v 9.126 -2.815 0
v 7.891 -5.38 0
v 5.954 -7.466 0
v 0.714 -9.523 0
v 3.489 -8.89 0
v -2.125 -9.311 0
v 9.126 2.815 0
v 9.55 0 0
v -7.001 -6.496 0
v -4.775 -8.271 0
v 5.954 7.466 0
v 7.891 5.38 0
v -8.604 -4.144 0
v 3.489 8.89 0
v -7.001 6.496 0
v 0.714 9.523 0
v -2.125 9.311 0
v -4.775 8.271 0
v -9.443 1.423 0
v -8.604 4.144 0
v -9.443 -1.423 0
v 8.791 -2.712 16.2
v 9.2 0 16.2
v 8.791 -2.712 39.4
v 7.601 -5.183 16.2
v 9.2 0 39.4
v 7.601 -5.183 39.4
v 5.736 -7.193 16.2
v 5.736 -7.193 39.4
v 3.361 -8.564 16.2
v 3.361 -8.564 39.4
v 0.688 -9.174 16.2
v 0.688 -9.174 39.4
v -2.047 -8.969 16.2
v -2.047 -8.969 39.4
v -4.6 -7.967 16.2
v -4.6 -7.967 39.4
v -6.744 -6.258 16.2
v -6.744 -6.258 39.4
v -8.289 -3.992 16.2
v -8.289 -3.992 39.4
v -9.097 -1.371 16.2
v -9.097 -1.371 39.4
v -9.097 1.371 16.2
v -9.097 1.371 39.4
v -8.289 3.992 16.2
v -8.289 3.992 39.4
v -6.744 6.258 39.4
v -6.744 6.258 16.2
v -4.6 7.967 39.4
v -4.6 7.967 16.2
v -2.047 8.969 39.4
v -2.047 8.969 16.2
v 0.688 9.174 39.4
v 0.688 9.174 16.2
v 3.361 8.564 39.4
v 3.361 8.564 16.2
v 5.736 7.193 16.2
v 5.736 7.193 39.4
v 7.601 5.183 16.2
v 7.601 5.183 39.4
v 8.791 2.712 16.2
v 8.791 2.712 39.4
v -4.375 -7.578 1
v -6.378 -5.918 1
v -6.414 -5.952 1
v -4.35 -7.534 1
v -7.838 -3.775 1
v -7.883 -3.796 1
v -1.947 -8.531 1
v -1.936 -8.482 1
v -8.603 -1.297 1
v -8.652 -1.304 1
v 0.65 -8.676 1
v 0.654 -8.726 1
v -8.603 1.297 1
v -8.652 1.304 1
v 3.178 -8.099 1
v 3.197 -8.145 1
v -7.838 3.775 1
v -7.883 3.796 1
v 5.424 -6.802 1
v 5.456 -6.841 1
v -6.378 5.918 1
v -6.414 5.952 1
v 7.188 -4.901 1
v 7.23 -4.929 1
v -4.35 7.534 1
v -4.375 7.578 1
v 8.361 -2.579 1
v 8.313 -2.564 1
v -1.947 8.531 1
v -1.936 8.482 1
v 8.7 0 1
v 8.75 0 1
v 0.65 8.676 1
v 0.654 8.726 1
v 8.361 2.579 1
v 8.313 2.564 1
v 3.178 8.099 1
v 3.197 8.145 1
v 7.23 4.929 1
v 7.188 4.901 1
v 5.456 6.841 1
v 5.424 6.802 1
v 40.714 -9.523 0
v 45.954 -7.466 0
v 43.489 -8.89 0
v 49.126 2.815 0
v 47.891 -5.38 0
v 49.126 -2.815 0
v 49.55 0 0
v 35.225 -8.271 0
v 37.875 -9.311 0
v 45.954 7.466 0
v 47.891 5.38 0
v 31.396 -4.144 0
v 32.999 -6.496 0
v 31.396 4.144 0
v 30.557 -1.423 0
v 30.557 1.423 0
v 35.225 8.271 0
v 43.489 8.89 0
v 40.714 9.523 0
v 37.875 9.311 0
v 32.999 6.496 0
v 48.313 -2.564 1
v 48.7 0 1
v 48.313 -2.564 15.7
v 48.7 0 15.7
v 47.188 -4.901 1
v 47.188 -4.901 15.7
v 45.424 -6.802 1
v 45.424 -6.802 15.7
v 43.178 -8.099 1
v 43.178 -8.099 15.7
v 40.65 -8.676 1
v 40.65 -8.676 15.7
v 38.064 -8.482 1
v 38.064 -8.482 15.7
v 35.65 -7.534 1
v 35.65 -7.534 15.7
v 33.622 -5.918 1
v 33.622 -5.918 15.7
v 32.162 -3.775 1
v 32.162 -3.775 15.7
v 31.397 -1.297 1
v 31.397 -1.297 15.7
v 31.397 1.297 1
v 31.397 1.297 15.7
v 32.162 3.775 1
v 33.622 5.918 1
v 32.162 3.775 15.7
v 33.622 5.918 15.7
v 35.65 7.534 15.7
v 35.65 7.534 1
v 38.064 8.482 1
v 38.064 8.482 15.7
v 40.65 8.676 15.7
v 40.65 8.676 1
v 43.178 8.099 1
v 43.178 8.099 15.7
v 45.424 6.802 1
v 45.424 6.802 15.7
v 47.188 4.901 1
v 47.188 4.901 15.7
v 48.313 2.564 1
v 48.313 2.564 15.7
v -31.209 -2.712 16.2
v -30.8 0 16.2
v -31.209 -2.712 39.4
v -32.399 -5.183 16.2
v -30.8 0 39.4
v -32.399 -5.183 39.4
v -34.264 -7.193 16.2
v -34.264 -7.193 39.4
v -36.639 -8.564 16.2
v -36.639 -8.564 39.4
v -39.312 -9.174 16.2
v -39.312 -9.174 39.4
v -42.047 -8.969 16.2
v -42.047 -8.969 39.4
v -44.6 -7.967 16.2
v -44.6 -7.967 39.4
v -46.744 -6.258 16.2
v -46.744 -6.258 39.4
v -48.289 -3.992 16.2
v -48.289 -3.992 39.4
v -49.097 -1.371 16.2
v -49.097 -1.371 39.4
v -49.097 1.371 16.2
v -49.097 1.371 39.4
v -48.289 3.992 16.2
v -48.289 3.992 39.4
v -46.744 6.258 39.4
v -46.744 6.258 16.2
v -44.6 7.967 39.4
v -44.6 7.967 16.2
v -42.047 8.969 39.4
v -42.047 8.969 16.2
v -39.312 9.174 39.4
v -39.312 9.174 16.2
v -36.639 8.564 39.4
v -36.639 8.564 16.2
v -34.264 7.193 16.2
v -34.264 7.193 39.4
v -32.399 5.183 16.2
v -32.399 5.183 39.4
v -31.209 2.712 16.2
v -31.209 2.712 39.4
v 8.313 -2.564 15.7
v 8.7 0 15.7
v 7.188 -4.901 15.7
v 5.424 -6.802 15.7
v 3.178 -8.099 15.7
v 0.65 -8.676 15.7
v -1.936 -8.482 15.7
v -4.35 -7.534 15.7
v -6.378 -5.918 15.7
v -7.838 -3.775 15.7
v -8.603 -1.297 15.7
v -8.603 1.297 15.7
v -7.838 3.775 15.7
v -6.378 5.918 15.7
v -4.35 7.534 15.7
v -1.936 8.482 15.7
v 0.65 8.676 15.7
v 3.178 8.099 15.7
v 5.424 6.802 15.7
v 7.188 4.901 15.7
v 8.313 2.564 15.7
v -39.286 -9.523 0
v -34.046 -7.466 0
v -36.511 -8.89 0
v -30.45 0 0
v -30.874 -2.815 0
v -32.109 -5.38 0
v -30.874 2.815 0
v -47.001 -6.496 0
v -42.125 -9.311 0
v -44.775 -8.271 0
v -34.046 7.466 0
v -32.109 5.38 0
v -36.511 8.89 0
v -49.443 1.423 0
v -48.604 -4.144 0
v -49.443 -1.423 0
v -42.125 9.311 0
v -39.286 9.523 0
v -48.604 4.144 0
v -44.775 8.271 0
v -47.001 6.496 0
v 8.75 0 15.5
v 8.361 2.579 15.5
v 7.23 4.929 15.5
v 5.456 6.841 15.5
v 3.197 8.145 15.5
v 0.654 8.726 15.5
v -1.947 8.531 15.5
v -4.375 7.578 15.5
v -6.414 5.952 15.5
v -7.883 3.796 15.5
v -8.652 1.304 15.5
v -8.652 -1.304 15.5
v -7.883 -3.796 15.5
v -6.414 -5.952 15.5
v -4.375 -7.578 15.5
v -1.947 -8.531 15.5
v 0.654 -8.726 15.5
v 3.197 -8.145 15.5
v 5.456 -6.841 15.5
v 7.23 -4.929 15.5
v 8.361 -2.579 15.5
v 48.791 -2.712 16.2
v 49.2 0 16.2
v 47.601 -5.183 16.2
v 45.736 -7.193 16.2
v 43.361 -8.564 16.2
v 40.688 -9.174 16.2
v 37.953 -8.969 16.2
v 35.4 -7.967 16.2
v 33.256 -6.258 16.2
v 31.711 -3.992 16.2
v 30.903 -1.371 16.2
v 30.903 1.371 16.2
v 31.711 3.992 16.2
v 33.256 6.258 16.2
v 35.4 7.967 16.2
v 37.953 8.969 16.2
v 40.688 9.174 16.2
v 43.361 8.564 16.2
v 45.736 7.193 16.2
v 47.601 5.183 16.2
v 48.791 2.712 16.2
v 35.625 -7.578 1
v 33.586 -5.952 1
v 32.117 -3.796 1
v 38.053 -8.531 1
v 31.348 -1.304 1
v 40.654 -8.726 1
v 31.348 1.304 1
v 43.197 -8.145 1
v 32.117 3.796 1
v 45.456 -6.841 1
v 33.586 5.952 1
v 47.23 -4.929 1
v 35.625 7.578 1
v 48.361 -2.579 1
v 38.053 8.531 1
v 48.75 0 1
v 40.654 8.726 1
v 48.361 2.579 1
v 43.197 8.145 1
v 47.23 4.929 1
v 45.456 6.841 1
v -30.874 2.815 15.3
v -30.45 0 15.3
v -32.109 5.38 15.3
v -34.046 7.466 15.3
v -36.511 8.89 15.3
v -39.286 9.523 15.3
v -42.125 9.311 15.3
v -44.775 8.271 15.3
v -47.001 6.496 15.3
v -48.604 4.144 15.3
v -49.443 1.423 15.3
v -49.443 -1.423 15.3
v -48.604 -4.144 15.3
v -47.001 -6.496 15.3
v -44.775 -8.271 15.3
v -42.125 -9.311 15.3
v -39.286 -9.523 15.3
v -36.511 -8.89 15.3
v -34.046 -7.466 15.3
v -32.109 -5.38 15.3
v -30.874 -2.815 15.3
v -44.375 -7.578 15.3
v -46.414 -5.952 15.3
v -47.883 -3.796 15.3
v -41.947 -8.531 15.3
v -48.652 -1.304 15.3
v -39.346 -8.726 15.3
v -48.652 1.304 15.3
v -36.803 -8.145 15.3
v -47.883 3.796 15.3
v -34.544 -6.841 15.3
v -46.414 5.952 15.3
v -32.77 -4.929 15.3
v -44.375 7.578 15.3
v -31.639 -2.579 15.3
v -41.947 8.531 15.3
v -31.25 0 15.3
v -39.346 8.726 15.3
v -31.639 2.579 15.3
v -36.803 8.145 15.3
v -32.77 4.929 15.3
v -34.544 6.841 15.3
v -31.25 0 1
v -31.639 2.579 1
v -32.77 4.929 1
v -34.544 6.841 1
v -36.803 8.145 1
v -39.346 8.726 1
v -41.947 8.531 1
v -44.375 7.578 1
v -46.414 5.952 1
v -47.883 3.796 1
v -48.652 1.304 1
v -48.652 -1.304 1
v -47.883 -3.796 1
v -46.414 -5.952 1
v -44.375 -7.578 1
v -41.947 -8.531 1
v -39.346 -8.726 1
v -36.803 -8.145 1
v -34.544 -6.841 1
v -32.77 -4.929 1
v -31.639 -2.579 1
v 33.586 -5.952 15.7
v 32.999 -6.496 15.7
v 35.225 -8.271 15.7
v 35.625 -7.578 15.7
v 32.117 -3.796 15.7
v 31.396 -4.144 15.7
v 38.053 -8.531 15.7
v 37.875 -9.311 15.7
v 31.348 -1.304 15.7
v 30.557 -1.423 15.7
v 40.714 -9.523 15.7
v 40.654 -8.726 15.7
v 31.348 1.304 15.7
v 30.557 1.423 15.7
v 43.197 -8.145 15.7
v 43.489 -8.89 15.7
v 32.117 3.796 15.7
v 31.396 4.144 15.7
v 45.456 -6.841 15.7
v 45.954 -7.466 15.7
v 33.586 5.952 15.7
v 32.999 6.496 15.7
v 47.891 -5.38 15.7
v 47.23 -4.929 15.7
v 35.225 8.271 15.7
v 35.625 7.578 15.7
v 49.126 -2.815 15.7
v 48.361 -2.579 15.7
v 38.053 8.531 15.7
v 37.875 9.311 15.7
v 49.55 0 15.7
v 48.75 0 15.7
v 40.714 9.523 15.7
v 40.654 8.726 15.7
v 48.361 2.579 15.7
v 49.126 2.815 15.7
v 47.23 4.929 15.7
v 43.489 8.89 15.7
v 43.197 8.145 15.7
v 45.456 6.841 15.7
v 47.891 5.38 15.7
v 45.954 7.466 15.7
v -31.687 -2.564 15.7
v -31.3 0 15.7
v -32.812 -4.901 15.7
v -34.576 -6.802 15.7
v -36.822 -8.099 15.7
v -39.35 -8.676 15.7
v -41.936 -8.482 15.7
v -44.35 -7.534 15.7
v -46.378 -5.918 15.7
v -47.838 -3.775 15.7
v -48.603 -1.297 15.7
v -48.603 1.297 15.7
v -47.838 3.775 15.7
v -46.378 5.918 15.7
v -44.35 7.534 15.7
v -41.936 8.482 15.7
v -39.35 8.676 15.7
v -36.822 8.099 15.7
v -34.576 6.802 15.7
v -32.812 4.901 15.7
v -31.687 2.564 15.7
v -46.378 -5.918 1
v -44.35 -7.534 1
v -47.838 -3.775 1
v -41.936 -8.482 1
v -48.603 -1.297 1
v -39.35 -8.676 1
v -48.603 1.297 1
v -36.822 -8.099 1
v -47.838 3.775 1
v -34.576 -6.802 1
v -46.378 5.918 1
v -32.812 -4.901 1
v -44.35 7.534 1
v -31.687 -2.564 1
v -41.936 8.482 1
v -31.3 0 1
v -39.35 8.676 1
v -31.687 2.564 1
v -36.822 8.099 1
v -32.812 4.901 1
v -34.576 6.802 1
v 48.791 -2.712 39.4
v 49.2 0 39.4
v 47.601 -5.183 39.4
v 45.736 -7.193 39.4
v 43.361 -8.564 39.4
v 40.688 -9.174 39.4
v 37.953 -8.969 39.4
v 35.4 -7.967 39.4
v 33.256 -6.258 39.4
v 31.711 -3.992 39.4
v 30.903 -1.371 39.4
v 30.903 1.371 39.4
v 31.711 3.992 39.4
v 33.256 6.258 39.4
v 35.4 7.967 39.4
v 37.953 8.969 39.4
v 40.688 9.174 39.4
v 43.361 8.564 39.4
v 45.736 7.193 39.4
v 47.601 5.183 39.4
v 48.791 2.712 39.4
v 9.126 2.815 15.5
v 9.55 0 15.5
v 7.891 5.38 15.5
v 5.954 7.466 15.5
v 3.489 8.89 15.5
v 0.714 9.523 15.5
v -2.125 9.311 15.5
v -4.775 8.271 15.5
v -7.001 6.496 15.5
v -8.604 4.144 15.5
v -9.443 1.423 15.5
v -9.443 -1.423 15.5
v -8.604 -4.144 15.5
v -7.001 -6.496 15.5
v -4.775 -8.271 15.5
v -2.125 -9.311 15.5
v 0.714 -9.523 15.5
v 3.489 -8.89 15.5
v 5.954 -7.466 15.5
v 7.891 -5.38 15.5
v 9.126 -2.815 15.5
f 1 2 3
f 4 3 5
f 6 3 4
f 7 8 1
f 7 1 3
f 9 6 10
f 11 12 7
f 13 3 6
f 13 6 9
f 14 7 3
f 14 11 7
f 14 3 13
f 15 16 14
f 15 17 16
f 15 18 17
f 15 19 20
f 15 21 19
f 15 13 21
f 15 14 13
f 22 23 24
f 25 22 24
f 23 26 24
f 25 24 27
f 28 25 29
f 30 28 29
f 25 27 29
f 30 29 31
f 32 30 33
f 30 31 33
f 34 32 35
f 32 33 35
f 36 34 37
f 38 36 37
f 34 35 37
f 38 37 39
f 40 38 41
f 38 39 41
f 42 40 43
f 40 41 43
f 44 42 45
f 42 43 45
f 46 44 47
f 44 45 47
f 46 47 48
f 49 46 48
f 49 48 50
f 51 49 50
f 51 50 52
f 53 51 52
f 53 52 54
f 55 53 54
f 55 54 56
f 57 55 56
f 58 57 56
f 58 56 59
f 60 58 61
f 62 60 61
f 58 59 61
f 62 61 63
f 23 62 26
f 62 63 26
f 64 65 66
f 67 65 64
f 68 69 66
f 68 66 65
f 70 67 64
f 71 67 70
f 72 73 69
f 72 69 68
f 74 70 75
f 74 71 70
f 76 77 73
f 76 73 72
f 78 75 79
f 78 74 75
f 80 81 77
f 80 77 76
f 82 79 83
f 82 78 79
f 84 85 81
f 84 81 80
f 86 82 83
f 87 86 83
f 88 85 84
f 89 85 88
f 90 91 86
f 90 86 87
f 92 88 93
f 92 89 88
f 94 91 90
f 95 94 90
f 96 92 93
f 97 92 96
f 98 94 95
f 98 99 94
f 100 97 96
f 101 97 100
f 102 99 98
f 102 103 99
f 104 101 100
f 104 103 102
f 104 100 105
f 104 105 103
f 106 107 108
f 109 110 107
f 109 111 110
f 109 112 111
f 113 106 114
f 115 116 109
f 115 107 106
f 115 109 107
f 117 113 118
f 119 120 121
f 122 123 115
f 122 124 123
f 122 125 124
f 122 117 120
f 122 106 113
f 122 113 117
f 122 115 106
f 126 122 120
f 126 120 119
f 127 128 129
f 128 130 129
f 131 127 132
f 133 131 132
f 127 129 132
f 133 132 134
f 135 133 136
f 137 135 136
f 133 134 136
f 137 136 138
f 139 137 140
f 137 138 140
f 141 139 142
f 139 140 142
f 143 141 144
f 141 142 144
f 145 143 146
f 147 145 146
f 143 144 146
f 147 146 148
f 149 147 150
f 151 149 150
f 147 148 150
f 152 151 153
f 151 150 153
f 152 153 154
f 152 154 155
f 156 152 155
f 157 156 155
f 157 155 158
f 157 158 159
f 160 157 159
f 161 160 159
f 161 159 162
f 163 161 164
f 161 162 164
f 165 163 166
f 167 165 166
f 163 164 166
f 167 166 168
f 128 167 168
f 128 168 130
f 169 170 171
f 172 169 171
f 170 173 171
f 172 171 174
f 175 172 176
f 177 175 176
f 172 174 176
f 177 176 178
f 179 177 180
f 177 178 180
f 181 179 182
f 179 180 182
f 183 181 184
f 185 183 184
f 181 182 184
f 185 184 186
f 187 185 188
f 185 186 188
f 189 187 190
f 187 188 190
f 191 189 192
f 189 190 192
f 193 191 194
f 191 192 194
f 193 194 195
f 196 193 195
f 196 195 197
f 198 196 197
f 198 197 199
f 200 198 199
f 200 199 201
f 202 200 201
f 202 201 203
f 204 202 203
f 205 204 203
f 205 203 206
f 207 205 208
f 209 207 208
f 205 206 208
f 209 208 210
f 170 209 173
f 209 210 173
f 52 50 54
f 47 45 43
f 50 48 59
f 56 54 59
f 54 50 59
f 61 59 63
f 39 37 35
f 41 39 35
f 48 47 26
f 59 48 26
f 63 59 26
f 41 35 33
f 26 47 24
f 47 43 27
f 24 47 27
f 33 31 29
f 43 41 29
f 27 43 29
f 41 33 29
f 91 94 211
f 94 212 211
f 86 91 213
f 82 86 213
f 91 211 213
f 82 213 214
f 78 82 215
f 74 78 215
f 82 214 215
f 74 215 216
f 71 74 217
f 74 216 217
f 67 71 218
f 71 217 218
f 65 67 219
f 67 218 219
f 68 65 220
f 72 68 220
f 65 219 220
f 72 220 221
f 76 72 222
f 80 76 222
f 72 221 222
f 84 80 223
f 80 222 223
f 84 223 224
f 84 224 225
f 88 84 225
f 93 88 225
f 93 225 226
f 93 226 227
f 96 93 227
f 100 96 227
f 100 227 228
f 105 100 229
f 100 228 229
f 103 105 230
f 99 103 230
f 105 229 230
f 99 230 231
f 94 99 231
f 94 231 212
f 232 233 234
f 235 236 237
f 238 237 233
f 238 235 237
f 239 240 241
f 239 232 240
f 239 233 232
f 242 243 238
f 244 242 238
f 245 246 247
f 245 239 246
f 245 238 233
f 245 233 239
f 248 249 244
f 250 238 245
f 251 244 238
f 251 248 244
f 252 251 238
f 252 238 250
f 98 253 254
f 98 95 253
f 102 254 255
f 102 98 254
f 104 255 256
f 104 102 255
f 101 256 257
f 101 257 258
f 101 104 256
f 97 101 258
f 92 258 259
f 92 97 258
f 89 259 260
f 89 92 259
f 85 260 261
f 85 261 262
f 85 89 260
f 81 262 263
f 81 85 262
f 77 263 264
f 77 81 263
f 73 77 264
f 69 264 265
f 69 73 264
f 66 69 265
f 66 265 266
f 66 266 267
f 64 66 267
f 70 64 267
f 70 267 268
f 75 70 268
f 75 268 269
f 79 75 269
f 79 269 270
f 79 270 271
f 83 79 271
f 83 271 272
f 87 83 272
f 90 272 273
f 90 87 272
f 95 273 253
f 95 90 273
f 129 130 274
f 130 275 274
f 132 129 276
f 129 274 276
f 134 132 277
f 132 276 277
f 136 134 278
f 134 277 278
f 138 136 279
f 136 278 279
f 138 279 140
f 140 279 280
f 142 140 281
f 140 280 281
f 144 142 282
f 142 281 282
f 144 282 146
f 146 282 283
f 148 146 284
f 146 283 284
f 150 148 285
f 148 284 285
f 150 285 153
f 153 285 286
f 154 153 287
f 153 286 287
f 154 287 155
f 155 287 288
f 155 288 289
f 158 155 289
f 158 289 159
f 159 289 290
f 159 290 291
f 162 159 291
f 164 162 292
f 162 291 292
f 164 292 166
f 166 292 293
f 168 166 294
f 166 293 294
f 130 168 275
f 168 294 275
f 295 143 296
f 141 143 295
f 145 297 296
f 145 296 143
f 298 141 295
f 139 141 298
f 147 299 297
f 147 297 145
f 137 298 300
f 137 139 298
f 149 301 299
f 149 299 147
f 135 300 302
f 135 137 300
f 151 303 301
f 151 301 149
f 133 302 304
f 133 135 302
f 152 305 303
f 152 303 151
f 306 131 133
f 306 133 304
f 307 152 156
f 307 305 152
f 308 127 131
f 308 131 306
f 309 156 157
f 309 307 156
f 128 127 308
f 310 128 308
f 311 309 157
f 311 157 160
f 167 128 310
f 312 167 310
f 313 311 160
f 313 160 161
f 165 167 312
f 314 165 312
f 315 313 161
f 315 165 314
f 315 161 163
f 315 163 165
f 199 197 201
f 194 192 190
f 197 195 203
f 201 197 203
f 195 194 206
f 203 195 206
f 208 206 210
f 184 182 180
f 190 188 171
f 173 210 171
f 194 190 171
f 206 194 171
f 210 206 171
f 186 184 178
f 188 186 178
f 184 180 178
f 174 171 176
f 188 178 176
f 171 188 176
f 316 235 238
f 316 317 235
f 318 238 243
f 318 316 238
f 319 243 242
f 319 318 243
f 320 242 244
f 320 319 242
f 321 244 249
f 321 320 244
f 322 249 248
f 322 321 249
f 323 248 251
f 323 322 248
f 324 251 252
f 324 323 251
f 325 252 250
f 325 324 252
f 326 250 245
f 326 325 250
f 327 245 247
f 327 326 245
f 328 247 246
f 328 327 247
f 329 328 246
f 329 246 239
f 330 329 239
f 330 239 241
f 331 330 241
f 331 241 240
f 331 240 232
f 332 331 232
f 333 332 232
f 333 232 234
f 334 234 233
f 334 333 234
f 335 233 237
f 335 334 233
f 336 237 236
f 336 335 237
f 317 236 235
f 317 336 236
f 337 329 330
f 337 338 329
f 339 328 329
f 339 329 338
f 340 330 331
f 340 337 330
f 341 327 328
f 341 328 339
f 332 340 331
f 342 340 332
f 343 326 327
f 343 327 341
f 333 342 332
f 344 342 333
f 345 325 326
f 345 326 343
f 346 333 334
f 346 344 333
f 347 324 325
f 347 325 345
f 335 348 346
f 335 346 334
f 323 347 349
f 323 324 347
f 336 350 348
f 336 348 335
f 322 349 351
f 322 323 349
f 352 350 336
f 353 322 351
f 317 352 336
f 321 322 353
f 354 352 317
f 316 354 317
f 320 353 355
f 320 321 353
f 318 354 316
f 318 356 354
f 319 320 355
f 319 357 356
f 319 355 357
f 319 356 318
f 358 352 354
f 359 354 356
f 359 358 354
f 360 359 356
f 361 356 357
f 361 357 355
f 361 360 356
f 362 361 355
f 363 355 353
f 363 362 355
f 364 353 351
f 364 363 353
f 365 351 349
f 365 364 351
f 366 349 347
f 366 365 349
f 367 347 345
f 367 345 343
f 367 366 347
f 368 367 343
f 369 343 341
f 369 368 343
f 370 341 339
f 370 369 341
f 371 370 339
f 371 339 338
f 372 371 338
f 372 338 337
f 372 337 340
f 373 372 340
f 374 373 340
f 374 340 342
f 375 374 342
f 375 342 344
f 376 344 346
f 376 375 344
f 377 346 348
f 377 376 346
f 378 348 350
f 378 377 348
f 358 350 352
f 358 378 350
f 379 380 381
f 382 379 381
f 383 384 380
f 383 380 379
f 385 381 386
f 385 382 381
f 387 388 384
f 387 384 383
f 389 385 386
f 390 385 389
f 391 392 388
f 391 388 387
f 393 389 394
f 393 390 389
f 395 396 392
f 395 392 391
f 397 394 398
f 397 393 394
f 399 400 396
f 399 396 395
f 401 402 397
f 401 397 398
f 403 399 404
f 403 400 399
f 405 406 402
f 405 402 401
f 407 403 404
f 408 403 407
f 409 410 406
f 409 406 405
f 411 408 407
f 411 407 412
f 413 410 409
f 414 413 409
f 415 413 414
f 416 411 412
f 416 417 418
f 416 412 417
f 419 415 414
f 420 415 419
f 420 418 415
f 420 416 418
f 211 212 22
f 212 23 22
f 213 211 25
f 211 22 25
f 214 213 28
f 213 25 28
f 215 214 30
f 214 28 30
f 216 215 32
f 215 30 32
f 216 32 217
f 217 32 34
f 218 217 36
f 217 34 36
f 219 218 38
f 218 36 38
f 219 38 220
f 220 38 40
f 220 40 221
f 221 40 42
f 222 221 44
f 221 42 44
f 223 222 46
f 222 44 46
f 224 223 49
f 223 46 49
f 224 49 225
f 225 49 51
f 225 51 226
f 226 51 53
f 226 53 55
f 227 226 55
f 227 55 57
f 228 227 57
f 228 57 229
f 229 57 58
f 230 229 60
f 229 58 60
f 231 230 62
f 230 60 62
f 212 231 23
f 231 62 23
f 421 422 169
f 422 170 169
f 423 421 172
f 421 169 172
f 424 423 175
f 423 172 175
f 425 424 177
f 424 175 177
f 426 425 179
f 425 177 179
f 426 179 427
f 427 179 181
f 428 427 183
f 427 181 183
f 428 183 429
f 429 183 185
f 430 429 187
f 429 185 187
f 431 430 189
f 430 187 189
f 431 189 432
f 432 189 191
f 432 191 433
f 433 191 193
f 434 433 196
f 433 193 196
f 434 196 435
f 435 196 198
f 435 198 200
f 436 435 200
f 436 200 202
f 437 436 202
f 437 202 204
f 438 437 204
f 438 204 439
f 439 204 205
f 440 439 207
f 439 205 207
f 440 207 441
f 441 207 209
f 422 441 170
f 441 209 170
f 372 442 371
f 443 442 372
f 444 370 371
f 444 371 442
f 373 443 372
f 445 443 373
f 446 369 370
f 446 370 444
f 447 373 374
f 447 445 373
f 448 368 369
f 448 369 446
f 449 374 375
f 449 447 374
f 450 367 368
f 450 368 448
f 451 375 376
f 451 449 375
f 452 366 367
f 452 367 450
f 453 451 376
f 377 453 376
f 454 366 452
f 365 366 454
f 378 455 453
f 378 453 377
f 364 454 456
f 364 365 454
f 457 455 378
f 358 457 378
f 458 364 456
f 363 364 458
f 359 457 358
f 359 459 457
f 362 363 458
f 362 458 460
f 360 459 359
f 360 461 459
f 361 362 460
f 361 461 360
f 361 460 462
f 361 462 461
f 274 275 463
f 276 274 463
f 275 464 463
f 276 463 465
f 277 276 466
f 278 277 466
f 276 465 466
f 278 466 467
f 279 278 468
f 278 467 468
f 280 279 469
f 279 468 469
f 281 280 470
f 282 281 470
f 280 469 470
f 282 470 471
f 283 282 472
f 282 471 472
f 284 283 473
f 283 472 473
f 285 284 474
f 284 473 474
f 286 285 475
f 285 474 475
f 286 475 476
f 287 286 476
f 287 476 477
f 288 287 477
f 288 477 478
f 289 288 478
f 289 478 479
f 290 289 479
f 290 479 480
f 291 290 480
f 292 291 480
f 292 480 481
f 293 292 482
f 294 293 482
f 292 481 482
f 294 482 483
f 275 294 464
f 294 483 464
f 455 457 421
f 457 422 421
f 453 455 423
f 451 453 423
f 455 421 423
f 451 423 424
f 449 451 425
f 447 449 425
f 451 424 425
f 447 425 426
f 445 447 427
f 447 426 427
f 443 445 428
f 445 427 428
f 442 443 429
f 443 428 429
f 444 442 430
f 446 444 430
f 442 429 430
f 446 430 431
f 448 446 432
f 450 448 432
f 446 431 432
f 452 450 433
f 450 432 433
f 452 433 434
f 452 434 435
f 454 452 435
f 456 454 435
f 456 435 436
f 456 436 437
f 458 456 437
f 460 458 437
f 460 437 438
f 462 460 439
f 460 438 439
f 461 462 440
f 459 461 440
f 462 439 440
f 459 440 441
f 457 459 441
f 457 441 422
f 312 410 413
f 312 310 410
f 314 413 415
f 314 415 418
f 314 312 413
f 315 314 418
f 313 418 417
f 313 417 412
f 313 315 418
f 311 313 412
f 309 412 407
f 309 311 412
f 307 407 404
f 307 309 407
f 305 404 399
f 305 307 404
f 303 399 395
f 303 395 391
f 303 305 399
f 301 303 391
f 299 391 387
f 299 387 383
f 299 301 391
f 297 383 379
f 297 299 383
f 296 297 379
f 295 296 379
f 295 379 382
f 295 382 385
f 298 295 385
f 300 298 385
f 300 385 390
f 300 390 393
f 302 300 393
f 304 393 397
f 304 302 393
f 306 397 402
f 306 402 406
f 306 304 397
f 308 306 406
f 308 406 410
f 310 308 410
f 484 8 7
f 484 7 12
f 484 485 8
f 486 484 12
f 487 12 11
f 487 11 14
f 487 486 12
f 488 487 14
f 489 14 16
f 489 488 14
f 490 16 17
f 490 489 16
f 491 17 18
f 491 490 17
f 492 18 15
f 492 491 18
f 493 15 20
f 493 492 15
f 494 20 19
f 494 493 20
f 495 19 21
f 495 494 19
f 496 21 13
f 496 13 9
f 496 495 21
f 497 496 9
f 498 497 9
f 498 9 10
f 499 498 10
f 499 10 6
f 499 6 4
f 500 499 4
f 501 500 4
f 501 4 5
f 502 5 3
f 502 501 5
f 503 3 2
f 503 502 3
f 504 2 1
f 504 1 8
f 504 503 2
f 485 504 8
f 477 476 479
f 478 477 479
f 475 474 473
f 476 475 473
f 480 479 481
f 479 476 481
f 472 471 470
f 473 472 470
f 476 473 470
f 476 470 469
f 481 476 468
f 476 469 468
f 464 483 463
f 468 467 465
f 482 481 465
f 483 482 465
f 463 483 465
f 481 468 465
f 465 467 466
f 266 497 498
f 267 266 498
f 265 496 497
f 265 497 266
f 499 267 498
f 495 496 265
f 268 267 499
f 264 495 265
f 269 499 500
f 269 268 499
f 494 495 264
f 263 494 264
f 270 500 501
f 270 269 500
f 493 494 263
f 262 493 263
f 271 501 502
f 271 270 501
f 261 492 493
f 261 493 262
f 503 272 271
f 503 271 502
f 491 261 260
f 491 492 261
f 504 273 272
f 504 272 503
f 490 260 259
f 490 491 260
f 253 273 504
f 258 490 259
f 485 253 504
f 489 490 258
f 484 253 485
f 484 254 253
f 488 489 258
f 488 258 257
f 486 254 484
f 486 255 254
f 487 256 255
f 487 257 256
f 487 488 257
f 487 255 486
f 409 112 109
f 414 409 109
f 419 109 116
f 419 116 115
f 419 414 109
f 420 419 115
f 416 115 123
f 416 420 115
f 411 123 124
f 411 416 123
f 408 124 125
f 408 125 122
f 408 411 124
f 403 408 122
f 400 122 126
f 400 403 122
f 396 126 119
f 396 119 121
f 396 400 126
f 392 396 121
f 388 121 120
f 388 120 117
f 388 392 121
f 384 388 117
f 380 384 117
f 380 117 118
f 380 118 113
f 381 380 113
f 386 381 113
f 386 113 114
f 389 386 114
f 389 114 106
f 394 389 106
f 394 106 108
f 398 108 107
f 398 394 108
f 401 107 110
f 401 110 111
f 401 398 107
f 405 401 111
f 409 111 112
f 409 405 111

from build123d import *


with BuildPart() as f1:
    # F0 (on Front) → F1 (revolve)
    with BuildSketch(Plane.XZ):
        Polygon((0, 1), (0, 0), (9.55, 0), (9.55, 15.5), (8.75, 15.5), (8.75, 1), align=None)
    revolve(axis=Axis((0, 0, 5.78928), (0, 0, 1)))

    # F8 (on Front) → F9 (revolve)
    with BuildSketch(Plane.XZ):
        Polygon((0, 39.4), (0, 1), (8.7, 1), (8.7, 15.7), (9.2, 16.2), (9.2, 39.4), align=None)
    revolve(axis=Axis((0, 0, 20.2), (0, 0, -1)))


with BuildPart() as f3:
    # F2 (on Front) → F3 (revolve)
    with BuildSketch(Plane.XZ):
        Polygon((-40, 1), (-40, 0), (-30.45, 0), (-30.45, 15.3), (-31.25, 15.3), (-31.25, 1), align=None)
    revolve(axis=Axis((-40, 0, 6.747161), (0, 0, 1)))

    # F6 (on Front) → F7 (revolve)
    with BuildSketch(Plane.XZ):
        Polygon((-40, 39.4), (-40, 1), (-31.3, 1), (-31.3, 15.7), (-30.8, 16.2), (-30.8, 39.4), align=None)
    revolve(axis=Axis((-40, 0, 20.2), (0, 0, -1)))


with BuildPart() as f5:
    # F4 (on Front) → F5 (revolve)
    with BuildSketch(Plane.XZ):
        Polygon((40, 1), (40, 0), (49.55, 0), (49.55, 15.7), (48.75, 15.7), (48.75, 1), align=None)
    revolve(axis=Axis((40, 0, 6.912579), (0, 0, 1)))

    # F10 (on Front) → F11 (revolve)
    with BuildSketch(Plane.XZ):
        Polygon((40, 39.4), (40, 1), (48.7, 1), (48.7, 15.7), (49.2, 16.2), (49.2, 39.4), align=None)
    revolve(axis=Axis((40, 0, 20.2), (0, 0, -1)))


solid = Compound([f1.part, f3.part, f5.part])
